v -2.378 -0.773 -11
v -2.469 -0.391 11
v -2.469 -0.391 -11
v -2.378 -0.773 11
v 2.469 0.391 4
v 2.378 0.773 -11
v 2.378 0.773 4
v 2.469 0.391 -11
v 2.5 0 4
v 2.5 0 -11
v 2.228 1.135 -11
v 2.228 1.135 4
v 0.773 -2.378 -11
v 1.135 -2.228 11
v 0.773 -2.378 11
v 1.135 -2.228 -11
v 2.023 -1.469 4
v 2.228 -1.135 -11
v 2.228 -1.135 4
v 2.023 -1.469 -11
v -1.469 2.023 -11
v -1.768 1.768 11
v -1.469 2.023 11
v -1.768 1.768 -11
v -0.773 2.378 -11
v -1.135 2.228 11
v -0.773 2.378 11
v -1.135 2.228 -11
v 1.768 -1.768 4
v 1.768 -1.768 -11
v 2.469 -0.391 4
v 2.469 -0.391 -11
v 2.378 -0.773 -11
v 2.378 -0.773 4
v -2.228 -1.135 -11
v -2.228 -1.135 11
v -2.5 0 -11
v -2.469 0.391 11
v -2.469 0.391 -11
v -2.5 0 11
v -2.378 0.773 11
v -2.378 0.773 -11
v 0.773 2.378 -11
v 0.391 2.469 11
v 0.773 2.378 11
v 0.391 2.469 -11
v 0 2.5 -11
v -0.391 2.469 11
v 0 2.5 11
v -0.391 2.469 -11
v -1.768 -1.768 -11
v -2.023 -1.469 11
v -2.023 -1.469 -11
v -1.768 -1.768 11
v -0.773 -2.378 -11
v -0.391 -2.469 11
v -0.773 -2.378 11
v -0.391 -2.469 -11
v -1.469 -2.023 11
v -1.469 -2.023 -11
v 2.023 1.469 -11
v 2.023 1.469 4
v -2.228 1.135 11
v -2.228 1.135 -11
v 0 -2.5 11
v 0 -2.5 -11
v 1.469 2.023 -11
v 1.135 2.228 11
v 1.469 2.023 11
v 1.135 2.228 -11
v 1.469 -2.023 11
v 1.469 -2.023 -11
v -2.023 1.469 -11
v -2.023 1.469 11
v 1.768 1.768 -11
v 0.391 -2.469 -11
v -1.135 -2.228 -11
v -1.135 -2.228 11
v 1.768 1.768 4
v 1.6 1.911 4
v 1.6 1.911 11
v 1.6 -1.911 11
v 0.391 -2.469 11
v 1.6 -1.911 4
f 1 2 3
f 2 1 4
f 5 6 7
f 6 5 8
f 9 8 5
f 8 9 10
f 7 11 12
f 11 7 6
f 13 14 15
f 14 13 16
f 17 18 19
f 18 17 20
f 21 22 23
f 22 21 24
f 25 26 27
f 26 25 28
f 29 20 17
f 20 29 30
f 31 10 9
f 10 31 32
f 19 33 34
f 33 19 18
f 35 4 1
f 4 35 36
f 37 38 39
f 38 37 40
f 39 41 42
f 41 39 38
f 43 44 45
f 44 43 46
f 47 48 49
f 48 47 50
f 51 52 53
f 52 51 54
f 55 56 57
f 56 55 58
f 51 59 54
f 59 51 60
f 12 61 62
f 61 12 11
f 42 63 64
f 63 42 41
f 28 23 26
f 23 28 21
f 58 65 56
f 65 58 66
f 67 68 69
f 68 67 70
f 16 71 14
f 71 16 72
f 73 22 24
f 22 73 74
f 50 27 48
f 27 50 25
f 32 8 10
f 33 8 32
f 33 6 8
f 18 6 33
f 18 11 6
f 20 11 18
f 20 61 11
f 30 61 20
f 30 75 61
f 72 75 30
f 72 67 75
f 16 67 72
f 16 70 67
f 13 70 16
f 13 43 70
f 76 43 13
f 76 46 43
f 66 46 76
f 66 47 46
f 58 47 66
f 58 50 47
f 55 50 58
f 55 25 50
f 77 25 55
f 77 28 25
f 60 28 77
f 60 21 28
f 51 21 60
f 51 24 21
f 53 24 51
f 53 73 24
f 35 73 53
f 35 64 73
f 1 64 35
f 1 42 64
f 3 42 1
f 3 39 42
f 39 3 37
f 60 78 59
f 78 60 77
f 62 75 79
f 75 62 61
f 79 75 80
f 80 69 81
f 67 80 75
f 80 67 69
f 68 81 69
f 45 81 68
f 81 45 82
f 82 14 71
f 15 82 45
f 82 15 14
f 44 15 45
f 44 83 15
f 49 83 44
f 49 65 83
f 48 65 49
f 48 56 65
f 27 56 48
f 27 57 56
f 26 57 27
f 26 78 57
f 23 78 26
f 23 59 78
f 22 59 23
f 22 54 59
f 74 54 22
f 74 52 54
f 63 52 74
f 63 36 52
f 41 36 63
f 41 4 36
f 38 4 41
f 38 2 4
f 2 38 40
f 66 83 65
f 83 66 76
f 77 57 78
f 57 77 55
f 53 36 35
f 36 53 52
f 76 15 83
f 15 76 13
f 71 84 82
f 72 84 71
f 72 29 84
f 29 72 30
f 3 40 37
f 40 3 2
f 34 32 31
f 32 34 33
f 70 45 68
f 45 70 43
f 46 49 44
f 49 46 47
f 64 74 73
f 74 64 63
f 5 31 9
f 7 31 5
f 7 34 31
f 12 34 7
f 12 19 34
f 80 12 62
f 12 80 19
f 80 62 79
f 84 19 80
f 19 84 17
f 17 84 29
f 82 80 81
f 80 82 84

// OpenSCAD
$fa = 2;
$fs = 0.4;

module motor_shaft() {
  color("#888890")
    difference() {
      cylinder(h = 22, d = 5, center = true);
      translate([2.2, 0, 8])
        cube([1.2, 6, 8], center = true);
    }
}

motor_shaft();
